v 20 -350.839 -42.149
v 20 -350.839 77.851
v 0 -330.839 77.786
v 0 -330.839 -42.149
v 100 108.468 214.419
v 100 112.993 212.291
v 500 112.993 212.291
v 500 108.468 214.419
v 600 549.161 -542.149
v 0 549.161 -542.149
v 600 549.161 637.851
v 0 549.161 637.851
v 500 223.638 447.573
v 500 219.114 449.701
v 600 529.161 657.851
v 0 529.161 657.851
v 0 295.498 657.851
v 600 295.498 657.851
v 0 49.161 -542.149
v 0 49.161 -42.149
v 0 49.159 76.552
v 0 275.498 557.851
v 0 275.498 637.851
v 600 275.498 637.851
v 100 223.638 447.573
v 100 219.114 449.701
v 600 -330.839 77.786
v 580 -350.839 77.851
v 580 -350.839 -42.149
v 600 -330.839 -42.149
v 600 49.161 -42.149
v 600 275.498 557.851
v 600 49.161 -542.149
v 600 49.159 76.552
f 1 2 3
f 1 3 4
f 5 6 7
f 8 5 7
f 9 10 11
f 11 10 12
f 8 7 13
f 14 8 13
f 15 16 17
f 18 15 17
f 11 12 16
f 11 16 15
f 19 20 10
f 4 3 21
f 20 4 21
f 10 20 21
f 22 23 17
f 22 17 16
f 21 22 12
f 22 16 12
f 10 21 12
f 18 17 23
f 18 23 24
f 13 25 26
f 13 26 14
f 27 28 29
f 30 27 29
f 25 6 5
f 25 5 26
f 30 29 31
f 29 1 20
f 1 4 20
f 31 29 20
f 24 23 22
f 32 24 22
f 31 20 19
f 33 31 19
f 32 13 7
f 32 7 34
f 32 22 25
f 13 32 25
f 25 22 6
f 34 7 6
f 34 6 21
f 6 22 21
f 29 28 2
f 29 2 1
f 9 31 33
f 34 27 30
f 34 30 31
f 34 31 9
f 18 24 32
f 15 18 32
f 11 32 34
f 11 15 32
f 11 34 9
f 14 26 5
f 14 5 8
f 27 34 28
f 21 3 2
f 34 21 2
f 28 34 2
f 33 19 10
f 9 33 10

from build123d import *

# Parameters (mm, degrees)
F1_DEPTH = 600
F2_W     = 400
F2_H     = 260
F3_DEPTH = 5
F4_SIZE  = 20


with BuildPart() as f1:
    # F0 (on Right) → F1 (new body)
    with BuildSketch(Plane.YZ):
        Polygon((549.161103, 657.850861), (275.498464, 657.850861), (275.498464, 557.850861), (49.158994, 76.551717), (-350.838897, 77.850861), (-350.838897, -42.149139), (49.161103, -42.149139), (49.161103, -542.149139), (549.161103, -542.149139), align=None)
    extrude(amount=F1_DEPTH)

    # F2 (on face) → F3 (join)
    with BuildSketch(Plane(origin=(0, 10.776047, -5.067628), x_dir=(1, 0, 0), z_dir=(0, -0.90493, 0.42556))):
        with Locations((300, 370.194057)):
            Rectangle(F2_W, F2_H)
    extrude(amount=F3_DEPTH)

    # F4
    f4_edges = [f1.edges().sort_by_distance(p)[0] for p in [
        (300, 275.498464, 657.850861),
        (300, 549.161103, 657.850861),
        (600, -350.838897, 17.850861),
        (0, -350.838897, 17.850861),
    ]]
    chamfer(f4_edges, length=F4_SIZE)


solid = f1.part
